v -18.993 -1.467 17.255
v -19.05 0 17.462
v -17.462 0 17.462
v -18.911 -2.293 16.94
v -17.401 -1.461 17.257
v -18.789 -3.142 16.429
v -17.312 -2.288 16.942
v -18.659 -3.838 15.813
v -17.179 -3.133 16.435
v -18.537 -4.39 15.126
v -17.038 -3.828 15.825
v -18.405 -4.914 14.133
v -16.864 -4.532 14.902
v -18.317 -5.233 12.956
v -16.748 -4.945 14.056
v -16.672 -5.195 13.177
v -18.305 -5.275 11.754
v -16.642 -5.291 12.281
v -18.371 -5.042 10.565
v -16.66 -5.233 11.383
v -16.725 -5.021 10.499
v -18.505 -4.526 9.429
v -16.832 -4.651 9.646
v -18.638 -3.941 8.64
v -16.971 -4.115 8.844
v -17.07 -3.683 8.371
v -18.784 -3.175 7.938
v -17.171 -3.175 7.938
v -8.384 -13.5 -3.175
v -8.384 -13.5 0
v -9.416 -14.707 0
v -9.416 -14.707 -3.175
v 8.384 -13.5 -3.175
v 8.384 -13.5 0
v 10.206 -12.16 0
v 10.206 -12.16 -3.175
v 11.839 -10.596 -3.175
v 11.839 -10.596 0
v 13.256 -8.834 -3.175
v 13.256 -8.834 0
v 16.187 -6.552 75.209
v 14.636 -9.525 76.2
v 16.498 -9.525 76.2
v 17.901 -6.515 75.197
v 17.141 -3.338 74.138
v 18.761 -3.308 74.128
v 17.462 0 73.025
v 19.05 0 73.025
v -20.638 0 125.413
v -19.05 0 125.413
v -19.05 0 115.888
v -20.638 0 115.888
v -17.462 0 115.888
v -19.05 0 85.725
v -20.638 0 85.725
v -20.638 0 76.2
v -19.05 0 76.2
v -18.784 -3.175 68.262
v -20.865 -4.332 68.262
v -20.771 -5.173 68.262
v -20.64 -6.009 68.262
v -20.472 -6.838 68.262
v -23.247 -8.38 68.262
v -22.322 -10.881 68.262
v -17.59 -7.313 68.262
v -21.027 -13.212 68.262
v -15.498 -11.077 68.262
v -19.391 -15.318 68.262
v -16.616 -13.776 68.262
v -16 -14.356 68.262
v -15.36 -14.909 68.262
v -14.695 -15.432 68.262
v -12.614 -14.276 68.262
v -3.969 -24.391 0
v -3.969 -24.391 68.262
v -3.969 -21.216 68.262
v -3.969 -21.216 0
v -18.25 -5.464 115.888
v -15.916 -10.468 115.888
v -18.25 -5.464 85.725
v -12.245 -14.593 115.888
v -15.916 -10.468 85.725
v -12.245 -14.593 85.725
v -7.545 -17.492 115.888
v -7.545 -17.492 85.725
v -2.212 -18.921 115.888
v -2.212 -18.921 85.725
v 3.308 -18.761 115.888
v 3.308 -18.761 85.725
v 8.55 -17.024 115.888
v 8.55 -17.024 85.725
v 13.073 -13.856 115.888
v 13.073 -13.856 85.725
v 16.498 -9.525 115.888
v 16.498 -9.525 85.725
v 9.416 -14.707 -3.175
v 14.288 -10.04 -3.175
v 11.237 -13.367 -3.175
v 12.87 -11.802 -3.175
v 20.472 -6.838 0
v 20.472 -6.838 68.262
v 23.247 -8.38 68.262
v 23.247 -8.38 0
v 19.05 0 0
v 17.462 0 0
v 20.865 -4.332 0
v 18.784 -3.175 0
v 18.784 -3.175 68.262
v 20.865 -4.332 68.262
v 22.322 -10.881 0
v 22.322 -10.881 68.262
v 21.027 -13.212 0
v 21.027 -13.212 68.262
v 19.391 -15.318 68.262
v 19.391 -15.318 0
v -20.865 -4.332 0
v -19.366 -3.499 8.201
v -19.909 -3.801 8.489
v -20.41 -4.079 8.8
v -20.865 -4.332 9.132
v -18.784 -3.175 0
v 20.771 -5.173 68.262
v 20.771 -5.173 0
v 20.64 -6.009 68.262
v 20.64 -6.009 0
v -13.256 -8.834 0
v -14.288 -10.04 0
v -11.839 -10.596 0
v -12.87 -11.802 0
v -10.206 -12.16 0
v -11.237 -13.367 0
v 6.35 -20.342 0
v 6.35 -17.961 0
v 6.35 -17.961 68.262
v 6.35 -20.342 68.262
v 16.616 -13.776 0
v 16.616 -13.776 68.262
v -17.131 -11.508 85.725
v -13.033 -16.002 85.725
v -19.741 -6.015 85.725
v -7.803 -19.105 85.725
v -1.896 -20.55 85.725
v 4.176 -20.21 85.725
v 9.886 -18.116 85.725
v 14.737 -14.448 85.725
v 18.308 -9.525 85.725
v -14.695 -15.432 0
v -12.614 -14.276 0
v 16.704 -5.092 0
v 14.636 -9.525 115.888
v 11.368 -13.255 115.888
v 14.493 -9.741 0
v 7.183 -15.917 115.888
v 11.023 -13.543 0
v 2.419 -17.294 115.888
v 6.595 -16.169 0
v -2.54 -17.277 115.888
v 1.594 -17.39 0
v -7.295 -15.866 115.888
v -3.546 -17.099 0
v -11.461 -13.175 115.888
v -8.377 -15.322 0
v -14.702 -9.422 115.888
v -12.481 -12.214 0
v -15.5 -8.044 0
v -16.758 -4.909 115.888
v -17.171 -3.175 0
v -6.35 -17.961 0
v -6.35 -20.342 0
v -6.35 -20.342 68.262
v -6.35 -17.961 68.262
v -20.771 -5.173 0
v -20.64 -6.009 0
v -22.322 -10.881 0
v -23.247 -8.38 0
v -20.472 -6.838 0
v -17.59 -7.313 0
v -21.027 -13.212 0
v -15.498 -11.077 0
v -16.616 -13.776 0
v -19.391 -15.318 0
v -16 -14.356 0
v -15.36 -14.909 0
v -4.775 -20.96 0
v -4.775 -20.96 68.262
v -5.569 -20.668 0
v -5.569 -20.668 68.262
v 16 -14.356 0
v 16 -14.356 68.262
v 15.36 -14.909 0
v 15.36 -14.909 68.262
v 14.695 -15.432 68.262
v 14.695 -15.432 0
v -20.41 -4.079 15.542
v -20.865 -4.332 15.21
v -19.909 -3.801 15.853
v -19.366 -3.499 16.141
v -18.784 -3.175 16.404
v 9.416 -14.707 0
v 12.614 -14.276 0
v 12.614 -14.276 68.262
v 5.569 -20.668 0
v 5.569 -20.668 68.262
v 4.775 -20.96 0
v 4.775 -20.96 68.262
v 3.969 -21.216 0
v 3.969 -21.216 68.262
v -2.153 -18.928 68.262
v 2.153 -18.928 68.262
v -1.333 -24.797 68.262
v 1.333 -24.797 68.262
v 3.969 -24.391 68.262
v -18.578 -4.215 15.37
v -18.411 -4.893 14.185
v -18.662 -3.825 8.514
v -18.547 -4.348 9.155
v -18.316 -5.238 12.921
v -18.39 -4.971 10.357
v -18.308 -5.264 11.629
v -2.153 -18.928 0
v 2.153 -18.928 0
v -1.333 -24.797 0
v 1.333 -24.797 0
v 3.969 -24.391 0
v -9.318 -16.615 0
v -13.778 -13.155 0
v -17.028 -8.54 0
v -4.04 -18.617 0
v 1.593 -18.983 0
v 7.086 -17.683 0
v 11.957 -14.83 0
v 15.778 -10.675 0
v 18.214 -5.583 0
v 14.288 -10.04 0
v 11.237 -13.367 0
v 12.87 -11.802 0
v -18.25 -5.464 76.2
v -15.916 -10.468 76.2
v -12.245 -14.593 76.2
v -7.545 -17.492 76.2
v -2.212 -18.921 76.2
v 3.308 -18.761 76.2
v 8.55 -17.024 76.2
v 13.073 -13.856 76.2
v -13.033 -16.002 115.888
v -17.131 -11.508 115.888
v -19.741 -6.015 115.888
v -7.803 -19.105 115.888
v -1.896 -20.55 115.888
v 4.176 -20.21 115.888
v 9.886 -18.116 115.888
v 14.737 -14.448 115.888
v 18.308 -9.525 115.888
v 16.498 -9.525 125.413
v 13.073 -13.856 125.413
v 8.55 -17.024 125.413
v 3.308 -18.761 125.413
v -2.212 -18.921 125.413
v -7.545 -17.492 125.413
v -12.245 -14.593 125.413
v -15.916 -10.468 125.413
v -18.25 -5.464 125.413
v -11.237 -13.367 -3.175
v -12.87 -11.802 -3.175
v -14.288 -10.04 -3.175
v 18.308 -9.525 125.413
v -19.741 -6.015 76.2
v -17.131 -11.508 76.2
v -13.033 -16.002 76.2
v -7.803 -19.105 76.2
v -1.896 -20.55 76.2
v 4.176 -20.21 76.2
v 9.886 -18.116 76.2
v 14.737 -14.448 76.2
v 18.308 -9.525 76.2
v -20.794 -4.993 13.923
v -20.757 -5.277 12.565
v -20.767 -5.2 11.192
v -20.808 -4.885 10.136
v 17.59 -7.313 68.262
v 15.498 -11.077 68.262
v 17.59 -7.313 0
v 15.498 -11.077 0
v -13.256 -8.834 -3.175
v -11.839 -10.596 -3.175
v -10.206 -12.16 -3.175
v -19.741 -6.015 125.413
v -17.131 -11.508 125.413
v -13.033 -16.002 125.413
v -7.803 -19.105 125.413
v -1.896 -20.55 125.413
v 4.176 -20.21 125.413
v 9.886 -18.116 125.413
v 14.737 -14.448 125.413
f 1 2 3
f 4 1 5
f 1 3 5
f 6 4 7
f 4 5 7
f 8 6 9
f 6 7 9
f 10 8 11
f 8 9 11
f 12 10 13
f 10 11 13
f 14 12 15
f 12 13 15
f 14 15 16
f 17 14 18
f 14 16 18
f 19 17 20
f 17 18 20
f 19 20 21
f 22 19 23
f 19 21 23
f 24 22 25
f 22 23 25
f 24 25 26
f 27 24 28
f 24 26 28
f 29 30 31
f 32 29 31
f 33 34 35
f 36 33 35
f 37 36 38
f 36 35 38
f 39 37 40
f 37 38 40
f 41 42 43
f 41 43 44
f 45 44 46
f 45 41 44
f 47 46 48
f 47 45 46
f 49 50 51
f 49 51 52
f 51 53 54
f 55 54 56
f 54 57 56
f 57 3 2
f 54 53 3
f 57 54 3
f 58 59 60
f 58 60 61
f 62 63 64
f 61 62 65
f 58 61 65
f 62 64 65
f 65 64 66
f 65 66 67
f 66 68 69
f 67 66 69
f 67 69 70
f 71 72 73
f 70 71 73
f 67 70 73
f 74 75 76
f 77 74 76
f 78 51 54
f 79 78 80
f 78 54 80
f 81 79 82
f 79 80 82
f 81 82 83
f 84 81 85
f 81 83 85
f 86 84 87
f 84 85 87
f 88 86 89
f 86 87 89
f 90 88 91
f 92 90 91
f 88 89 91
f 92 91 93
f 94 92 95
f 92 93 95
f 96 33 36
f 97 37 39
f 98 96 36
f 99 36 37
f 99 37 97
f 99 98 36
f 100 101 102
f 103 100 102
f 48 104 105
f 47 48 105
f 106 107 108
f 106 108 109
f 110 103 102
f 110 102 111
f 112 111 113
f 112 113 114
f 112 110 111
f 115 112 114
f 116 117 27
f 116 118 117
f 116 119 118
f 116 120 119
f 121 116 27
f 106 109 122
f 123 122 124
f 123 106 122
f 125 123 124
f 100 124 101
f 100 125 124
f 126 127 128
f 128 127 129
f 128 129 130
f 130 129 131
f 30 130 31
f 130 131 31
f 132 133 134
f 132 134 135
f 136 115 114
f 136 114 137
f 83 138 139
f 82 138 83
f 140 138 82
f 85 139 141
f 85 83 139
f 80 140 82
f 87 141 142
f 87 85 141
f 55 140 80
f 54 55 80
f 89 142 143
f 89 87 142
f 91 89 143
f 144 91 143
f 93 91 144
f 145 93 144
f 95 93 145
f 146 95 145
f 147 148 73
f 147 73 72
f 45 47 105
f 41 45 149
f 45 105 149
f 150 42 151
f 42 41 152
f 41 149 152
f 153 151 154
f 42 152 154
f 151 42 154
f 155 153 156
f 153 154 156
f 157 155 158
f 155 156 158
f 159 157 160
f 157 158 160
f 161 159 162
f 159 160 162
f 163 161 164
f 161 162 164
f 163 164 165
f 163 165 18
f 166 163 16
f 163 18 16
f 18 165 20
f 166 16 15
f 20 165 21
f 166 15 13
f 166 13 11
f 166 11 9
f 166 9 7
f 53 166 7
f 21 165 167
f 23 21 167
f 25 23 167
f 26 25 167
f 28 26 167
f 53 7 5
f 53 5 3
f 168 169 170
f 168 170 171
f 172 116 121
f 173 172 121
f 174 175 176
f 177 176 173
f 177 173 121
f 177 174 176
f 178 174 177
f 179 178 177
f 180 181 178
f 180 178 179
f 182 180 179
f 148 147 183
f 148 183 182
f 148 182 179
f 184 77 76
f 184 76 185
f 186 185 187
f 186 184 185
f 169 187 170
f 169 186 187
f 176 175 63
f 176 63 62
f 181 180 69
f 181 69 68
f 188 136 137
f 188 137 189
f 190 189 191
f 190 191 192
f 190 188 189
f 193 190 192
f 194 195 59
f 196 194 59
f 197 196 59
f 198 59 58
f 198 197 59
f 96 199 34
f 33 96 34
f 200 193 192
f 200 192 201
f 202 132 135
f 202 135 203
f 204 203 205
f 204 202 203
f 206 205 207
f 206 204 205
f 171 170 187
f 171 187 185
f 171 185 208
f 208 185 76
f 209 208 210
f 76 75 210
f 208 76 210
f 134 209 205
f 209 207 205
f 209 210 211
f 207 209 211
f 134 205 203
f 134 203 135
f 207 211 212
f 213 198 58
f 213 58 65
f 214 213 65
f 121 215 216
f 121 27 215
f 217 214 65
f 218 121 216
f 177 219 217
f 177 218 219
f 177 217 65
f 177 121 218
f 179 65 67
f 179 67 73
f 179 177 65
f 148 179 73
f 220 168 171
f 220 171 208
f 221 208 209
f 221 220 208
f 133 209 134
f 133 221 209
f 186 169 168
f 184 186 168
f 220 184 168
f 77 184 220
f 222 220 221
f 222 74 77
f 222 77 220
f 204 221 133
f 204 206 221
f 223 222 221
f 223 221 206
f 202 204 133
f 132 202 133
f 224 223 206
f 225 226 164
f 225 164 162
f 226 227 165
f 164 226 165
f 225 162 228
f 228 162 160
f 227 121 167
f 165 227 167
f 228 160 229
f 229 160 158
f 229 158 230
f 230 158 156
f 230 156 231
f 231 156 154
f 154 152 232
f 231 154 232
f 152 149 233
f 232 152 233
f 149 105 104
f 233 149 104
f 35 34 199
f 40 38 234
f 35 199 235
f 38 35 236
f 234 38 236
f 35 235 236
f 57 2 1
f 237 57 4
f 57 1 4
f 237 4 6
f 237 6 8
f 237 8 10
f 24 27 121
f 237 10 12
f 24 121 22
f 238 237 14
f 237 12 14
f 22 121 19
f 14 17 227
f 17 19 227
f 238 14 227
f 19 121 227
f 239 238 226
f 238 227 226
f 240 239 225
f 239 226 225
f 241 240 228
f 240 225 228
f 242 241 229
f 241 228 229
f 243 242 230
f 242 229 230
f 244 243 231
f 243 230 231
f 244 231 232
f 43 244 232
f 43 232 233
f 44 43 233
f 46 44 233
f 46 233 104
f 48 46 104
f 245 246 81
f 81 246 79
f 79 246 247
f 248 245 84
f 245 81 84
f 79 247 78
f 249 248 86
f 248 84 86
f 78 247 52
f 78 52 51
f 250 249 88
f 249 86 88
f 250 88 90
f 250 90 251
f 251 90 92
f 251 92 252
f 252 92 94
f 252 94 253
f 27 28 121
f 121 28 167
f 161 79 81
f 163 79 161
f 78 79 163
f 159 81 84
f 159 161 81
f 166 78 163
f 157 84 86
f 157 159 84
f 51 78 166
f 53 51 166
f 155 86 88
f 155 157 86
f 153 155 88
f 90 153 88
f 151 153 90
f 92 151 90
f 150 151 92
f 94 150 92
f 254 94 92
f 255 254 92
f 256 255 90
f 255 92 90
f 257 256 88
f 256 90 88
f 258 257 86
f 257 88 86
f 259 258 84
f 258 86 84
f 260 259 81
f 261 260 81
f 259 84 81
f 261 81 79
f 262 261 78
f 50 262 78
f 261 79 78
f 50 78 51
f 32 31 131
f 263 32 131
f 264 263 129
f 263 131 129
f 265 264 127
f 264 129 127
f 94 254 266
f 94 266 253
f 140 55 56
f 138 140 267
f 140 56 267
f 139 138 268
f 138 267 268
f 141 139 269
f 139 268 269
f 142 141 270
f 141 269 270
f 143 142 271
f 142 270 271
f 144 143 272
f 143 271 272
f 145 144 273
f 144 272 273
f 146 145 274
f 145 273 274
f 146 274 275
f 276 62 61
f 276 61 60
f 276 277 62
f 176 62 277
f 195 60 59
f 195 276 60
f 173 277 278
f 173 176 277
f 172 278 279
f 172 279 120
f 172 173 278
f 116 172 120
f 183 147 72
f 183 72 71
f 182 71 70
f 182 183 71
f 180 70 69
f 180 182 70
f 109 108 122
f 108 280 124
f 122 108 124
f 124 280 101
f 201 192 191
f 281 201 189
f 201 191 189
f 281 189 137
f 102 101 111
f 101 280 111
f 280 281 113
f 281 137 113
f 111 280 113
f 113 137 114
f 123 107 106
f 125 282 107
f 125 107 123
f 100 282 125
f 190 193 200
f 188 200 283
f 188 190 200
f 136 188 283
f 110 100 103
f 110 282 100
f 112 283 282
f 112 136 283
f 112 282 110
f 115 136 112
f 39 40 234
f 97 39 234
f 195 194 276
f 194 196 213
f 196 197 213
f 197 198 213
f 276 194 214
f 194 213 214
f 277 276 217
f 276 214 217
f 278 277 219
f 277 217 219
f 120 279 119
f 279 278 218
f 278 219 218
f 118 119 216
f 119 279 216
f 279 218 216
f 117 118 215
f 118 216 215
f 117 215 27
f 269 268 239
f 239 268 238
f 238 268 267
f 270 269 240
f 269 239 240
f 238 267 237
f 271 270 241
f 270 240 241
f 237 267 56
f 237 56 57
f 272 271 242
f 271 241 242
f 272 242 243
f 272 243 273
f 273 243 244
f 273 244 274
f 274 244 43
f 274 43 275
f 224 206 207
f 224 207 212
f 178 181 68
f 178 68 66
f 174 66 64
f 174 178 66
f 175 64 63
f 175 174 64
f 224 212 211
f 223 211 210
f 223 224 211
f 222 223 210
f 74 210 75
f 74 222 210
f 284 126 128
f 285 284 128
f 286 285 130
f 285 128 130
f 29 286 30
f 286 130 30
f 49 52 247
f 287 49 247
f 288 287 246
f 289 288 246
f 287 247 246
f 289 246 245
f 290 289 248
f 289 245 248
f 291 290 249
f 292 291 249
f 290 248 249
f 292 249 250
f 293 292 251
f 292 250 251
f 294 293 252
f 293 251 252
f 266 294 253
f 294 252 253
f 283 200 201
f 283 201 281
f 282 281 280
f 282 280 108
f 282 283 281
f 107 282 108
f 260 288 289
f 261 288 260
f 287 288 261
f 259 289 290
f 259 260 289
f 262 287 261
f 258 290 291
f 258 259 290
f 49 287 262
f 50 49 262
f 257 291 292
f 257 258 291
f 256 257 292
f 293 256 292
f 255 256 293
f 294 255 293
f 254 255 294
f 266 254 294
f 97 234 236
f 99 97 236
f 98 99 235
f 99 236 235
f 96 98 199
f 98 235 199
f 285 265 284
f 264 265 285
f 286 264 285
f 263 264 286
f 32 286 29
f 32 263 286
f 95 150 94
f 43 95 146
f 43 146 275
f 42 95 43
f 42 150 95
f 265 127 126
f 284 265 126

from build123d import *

# Parameters (mm, degrees)
F1_DEPTH  = 115.8875
F3_DEPTH  = 3.175
F4_DEPTH  = 68.2625
F6_DEPTH  = 9.525
F9_DEPTH  = 9.525
F11_DEPTH = 25.4
F13_DEPTH = 25.4


with BuildPart() as f1:
    # F0 (on Top) → F1 (new body)
    with BuildSketch(Plane.XY):
        with BuildLine():
            Line((-17.4625, 0), (-19.05, 0))
            ThreePointArc((-19.05, 0), (0, -19.05), (19.05, 0))
            Line((19.05, 0), (17.4625, 0))
            ThreePointArc((17.4625, 0), (0, -17.4625), (-17.4625, 0))
        make_face()
    extrude(amount=F1_DEPTH)

    # F8 (on offset) → F9 (join)
    with BuildSketch(Plane.XY.offset(76.2)):
        with BuildLine():
            Line((20.6375, 0), (19.05, 0))
            ThreePointArc((19.05, 0), (0, -19.05), (-19.05, 0))
            Line((-19.05, 0), (-20.6375, 0))
            ThreePointArc((-20.6375, 0), (0, -20.6375), (20.6375, 0))
        make_face()
    extrude(amount=F9_DEPTH)


with BuildPart() as f3:
    # F2 (on face) → F3 (new body)
    with BuildSketch(Plane(origin=(0, 0, 0), x_dir=(1, 0, 0), z_dir=(0, 0, -1))):
        with BuildLine():
            Line((-8.3839510943, 13.500053837), (-9.4155933276, 14.7066484469))
            ThreePointArc((-9.4155933276, 14.7066484469), (-12.0790322435, 12.6109431174), (-14.2875, 10.040231571))
            Line((-14.2875, 10.040231571), (-13.2558577667, 8.8336369612))
            ThreePointArc((-13.2558577667, 8.8336369612), (-11.0475587561, 11.4045246845), (-8.3839510943, 13.500053837))
        make_face()
    extrude(amount=F3_DEPTH)


with BuildPart() as f3b:
    # F2 (on face) → F3, piece 2 (new body)
    with BuildSketch(Plane(origin=(0, 0, 0), x_dir=(1, 0, 0), z_dir=(0, 0, -1))):
        with BuildLine():
            Line((13.2558577667, 8.8336369612), (14.2875, 10.040231571))
            ThreePointArc((14.2875, 10.040231571), (12.0790322435, 12.6109431174), (9.4155933276, 14.7066484469))
            Line((9.4155933276, 14.7066484469), (8.3839510943, 13.500053837))
            ThreePointArc((8.3839510943, 13.500053837), (11.0475587561, 11.4045246845), (13.2558577667, 8.8336369612))
        make_face()
    extrude(amount=F3_DEPTH)


with BuildPart() as f4:
    # F2 (on face) → F4 (new body)
    with BuildSketch(Plane(origin=(0, 0, 0), x_dir=(1, 0, 0), z_dir=(0, 0, -1))):
        with BuildLine():
            ThreePointArc((-6.35, 17.9605122421), (0, 19.05), (6.35, 17.9605122421))
            Line((6.35, 17.9605122421), (6.35, 20.3417622421))
            ThreePointArc((6.35, 20.3417622421), (5.1739390249, 20.8184627298), (3.96875, 21.215806644))
            Line((3.96875, 21.215806644), (3.96875, 24.390806644))
            ThreePointArc((3.96875, 24.390806644), (0, 24.8481217322), (-3.96875, 24.390806644))
            Line((-3.96875, 24.390806644), (-3.96875, 21.215806644))
            ThreePointArc((-3.96875, 21.215806644), (-5.1739390249, 20.8184627298), (-6.35, 20.3417622421))
            Line((-6.35, 20.3417622421), (-6.35, 17.9605122421))
        make_face()
    extrude(amount=-F4_DEPTH)


with BuildPart() as f4b:
    # F2 (on face) → F4, piece 2 (new body)
    with BuildSketch(Plane(origin=(0, 0, 0), x_dir=(1, 0, 0), z_dir=(0, 0, -1))):
        with BuildLine():
            Line((-20.8649246315, 4.331825393), (-18.7835533113, 3.175))
            ThreePointArc((-18.7835533113, 3.175), (-16.6509705616, 9.2546031441), (-12.6138178819, 14.2756470411))
            Line((-12.6138178819, 14.2756470411), (-14.6951892021, 15.4324724341))
            ThreePointArc((-14.6951892021, 15.4324724341), (-15.6831946291, 14.6361006314), (-16.6159876978, 13.7757170756))
            Line((-16.6159876978, 13.7757170756), (-19.3911494581, 15.3181509329))
            ThreePointArc((-19.3911494581, 15.3181509329), (-21.718915668, 12.0713651186), (-23.2472341015, 8.3802465323))
            Line((-23.2472341015, 8.3802465323), (-20.4720723412, 6.8378126749))
            ThreePointArc((-20.4720723412, 6.8378126749), (-20.7102552452, 5.5913650521), (-20.8649246315, 4.331825393))
        make_face()
    extrude(amount=-F4_DEPTH)


with BuildPart() as f4c:
    # F2 (on face) → F4, piece 3 (new body)
    with BuildSketch(Plane(origin=(0, 0, 0), x_dir=(1, 0, 0), z_dir=(0, 0, -1))):
        with BuildLine():
            ThreePointArc((12.6138178819, 14.2756470411), (16.6509705616, 9.2546031441), (18.7835533113, 3.175))
            Line((18.7835533113, 3.175), (20.8649246315, 4.331825393))
            ThreePointArc((20.8649246315, 4.331825393), (20.7102552452, 5.5913650521), (20.4720723412, 6.8378126749))
            Line((20.4720723412, 6.8378126749), (23.2472341015, 8.3802465323))
            ThreePointArc((23.2472341015, 8.3802465323), (21.718915668, 12.0713651186), (19.3911494581, 15.3181509329))
            Line((19.3911494581, 15.3181509329), (16.6159876978, 13.7757170756))
            ThreePointArc((16.6159876978, 13.7757170756), (15.6831946291, 14.6361006314), (14.6951892021, 15.4324724341))
            Line((14.6951892021, 15.4324724341), (12.6138178819, 14.2756470411))
        make_face()
    extrude(amount=-F4_DEPTH)


with BuildPart() as f6:
    # F5 (on face) → F6 (new body)
    with BuildSketch(Plane.XY.offset(115.8875)):
        with BuildLine():
            Line((20.6375, 0), (19.05, 0))
            ThreePointArc((19.05, 0), (0, -19.05), (-19.05, 0))
            Line((-19.05, 0), (-20.6375, 0))
            ThreePointArc((-20.6375, 0), (0, -20.6375), (20.6375, 0))
        make_face()
    extrude(amount=F6_DEPTH)


with BuildPart() as f11_tool:
    # F10 (on Right) → F11 (new body)
    with BuildSketch(Plane.YZ):
        Polygon((-9.525, 127.7427524328), (-9.525, 76.2), (0, 73.025), (0, 127.7427524328), align=None)
    extrude(amount=F11_DEPTH)


with BuildPart() as f1_1:
    add(f1.part)

    # F11: cut by f11_tool
    add(f11_tool.part, mode=Mode.SUBTRACT)


with BuildPart() as f6_1:
    add(f6.part)

    # F11: cut by f11_tool
    add(f11_tool.part, mode=Mode.SUBTRACT)


with BuildPart() as f13_tool:
    # F12 (on Right) → F13 (new body)
    with BuildSketch(Plane.YZ):
        with BuildLine():
            Line((0, 0), (0, 17.4625))
            ThreePointArc((0, 17.4625), (-5.0201157855, 13.8442052618), (-3.175, 7.9375))
            Line((-3.175, 7.9375), (-3.175, 0))
            Line((-3.175, 0), (0, 0))
        make_face()
        Polygon((1.9351648681, 17.4625), (0, 17.4625), (0, 0), (-3.175, 0), (-3.175, -0.7119281217), (1.9351648681, -0.7119281217), align=None)
    extrude(amount=-F13_DEPTH)


with BuildPart() as f1_2:
    add(f1_1.part)

    # F13: cut by f13_tool
    add(f13_tool.part, mode=Mode.SUBTRACT)


with BuildPart() as f4b_1:
    add(f4b.part)

    # F13: cut by f13_tool
    add(f13_tool.part, mode=Mode.SUBTRACT)


solid = Compound([f3.part, f3b.part, f4.part, f4c.part, f6_1.part, f1_2.part, f4b_1.part])
